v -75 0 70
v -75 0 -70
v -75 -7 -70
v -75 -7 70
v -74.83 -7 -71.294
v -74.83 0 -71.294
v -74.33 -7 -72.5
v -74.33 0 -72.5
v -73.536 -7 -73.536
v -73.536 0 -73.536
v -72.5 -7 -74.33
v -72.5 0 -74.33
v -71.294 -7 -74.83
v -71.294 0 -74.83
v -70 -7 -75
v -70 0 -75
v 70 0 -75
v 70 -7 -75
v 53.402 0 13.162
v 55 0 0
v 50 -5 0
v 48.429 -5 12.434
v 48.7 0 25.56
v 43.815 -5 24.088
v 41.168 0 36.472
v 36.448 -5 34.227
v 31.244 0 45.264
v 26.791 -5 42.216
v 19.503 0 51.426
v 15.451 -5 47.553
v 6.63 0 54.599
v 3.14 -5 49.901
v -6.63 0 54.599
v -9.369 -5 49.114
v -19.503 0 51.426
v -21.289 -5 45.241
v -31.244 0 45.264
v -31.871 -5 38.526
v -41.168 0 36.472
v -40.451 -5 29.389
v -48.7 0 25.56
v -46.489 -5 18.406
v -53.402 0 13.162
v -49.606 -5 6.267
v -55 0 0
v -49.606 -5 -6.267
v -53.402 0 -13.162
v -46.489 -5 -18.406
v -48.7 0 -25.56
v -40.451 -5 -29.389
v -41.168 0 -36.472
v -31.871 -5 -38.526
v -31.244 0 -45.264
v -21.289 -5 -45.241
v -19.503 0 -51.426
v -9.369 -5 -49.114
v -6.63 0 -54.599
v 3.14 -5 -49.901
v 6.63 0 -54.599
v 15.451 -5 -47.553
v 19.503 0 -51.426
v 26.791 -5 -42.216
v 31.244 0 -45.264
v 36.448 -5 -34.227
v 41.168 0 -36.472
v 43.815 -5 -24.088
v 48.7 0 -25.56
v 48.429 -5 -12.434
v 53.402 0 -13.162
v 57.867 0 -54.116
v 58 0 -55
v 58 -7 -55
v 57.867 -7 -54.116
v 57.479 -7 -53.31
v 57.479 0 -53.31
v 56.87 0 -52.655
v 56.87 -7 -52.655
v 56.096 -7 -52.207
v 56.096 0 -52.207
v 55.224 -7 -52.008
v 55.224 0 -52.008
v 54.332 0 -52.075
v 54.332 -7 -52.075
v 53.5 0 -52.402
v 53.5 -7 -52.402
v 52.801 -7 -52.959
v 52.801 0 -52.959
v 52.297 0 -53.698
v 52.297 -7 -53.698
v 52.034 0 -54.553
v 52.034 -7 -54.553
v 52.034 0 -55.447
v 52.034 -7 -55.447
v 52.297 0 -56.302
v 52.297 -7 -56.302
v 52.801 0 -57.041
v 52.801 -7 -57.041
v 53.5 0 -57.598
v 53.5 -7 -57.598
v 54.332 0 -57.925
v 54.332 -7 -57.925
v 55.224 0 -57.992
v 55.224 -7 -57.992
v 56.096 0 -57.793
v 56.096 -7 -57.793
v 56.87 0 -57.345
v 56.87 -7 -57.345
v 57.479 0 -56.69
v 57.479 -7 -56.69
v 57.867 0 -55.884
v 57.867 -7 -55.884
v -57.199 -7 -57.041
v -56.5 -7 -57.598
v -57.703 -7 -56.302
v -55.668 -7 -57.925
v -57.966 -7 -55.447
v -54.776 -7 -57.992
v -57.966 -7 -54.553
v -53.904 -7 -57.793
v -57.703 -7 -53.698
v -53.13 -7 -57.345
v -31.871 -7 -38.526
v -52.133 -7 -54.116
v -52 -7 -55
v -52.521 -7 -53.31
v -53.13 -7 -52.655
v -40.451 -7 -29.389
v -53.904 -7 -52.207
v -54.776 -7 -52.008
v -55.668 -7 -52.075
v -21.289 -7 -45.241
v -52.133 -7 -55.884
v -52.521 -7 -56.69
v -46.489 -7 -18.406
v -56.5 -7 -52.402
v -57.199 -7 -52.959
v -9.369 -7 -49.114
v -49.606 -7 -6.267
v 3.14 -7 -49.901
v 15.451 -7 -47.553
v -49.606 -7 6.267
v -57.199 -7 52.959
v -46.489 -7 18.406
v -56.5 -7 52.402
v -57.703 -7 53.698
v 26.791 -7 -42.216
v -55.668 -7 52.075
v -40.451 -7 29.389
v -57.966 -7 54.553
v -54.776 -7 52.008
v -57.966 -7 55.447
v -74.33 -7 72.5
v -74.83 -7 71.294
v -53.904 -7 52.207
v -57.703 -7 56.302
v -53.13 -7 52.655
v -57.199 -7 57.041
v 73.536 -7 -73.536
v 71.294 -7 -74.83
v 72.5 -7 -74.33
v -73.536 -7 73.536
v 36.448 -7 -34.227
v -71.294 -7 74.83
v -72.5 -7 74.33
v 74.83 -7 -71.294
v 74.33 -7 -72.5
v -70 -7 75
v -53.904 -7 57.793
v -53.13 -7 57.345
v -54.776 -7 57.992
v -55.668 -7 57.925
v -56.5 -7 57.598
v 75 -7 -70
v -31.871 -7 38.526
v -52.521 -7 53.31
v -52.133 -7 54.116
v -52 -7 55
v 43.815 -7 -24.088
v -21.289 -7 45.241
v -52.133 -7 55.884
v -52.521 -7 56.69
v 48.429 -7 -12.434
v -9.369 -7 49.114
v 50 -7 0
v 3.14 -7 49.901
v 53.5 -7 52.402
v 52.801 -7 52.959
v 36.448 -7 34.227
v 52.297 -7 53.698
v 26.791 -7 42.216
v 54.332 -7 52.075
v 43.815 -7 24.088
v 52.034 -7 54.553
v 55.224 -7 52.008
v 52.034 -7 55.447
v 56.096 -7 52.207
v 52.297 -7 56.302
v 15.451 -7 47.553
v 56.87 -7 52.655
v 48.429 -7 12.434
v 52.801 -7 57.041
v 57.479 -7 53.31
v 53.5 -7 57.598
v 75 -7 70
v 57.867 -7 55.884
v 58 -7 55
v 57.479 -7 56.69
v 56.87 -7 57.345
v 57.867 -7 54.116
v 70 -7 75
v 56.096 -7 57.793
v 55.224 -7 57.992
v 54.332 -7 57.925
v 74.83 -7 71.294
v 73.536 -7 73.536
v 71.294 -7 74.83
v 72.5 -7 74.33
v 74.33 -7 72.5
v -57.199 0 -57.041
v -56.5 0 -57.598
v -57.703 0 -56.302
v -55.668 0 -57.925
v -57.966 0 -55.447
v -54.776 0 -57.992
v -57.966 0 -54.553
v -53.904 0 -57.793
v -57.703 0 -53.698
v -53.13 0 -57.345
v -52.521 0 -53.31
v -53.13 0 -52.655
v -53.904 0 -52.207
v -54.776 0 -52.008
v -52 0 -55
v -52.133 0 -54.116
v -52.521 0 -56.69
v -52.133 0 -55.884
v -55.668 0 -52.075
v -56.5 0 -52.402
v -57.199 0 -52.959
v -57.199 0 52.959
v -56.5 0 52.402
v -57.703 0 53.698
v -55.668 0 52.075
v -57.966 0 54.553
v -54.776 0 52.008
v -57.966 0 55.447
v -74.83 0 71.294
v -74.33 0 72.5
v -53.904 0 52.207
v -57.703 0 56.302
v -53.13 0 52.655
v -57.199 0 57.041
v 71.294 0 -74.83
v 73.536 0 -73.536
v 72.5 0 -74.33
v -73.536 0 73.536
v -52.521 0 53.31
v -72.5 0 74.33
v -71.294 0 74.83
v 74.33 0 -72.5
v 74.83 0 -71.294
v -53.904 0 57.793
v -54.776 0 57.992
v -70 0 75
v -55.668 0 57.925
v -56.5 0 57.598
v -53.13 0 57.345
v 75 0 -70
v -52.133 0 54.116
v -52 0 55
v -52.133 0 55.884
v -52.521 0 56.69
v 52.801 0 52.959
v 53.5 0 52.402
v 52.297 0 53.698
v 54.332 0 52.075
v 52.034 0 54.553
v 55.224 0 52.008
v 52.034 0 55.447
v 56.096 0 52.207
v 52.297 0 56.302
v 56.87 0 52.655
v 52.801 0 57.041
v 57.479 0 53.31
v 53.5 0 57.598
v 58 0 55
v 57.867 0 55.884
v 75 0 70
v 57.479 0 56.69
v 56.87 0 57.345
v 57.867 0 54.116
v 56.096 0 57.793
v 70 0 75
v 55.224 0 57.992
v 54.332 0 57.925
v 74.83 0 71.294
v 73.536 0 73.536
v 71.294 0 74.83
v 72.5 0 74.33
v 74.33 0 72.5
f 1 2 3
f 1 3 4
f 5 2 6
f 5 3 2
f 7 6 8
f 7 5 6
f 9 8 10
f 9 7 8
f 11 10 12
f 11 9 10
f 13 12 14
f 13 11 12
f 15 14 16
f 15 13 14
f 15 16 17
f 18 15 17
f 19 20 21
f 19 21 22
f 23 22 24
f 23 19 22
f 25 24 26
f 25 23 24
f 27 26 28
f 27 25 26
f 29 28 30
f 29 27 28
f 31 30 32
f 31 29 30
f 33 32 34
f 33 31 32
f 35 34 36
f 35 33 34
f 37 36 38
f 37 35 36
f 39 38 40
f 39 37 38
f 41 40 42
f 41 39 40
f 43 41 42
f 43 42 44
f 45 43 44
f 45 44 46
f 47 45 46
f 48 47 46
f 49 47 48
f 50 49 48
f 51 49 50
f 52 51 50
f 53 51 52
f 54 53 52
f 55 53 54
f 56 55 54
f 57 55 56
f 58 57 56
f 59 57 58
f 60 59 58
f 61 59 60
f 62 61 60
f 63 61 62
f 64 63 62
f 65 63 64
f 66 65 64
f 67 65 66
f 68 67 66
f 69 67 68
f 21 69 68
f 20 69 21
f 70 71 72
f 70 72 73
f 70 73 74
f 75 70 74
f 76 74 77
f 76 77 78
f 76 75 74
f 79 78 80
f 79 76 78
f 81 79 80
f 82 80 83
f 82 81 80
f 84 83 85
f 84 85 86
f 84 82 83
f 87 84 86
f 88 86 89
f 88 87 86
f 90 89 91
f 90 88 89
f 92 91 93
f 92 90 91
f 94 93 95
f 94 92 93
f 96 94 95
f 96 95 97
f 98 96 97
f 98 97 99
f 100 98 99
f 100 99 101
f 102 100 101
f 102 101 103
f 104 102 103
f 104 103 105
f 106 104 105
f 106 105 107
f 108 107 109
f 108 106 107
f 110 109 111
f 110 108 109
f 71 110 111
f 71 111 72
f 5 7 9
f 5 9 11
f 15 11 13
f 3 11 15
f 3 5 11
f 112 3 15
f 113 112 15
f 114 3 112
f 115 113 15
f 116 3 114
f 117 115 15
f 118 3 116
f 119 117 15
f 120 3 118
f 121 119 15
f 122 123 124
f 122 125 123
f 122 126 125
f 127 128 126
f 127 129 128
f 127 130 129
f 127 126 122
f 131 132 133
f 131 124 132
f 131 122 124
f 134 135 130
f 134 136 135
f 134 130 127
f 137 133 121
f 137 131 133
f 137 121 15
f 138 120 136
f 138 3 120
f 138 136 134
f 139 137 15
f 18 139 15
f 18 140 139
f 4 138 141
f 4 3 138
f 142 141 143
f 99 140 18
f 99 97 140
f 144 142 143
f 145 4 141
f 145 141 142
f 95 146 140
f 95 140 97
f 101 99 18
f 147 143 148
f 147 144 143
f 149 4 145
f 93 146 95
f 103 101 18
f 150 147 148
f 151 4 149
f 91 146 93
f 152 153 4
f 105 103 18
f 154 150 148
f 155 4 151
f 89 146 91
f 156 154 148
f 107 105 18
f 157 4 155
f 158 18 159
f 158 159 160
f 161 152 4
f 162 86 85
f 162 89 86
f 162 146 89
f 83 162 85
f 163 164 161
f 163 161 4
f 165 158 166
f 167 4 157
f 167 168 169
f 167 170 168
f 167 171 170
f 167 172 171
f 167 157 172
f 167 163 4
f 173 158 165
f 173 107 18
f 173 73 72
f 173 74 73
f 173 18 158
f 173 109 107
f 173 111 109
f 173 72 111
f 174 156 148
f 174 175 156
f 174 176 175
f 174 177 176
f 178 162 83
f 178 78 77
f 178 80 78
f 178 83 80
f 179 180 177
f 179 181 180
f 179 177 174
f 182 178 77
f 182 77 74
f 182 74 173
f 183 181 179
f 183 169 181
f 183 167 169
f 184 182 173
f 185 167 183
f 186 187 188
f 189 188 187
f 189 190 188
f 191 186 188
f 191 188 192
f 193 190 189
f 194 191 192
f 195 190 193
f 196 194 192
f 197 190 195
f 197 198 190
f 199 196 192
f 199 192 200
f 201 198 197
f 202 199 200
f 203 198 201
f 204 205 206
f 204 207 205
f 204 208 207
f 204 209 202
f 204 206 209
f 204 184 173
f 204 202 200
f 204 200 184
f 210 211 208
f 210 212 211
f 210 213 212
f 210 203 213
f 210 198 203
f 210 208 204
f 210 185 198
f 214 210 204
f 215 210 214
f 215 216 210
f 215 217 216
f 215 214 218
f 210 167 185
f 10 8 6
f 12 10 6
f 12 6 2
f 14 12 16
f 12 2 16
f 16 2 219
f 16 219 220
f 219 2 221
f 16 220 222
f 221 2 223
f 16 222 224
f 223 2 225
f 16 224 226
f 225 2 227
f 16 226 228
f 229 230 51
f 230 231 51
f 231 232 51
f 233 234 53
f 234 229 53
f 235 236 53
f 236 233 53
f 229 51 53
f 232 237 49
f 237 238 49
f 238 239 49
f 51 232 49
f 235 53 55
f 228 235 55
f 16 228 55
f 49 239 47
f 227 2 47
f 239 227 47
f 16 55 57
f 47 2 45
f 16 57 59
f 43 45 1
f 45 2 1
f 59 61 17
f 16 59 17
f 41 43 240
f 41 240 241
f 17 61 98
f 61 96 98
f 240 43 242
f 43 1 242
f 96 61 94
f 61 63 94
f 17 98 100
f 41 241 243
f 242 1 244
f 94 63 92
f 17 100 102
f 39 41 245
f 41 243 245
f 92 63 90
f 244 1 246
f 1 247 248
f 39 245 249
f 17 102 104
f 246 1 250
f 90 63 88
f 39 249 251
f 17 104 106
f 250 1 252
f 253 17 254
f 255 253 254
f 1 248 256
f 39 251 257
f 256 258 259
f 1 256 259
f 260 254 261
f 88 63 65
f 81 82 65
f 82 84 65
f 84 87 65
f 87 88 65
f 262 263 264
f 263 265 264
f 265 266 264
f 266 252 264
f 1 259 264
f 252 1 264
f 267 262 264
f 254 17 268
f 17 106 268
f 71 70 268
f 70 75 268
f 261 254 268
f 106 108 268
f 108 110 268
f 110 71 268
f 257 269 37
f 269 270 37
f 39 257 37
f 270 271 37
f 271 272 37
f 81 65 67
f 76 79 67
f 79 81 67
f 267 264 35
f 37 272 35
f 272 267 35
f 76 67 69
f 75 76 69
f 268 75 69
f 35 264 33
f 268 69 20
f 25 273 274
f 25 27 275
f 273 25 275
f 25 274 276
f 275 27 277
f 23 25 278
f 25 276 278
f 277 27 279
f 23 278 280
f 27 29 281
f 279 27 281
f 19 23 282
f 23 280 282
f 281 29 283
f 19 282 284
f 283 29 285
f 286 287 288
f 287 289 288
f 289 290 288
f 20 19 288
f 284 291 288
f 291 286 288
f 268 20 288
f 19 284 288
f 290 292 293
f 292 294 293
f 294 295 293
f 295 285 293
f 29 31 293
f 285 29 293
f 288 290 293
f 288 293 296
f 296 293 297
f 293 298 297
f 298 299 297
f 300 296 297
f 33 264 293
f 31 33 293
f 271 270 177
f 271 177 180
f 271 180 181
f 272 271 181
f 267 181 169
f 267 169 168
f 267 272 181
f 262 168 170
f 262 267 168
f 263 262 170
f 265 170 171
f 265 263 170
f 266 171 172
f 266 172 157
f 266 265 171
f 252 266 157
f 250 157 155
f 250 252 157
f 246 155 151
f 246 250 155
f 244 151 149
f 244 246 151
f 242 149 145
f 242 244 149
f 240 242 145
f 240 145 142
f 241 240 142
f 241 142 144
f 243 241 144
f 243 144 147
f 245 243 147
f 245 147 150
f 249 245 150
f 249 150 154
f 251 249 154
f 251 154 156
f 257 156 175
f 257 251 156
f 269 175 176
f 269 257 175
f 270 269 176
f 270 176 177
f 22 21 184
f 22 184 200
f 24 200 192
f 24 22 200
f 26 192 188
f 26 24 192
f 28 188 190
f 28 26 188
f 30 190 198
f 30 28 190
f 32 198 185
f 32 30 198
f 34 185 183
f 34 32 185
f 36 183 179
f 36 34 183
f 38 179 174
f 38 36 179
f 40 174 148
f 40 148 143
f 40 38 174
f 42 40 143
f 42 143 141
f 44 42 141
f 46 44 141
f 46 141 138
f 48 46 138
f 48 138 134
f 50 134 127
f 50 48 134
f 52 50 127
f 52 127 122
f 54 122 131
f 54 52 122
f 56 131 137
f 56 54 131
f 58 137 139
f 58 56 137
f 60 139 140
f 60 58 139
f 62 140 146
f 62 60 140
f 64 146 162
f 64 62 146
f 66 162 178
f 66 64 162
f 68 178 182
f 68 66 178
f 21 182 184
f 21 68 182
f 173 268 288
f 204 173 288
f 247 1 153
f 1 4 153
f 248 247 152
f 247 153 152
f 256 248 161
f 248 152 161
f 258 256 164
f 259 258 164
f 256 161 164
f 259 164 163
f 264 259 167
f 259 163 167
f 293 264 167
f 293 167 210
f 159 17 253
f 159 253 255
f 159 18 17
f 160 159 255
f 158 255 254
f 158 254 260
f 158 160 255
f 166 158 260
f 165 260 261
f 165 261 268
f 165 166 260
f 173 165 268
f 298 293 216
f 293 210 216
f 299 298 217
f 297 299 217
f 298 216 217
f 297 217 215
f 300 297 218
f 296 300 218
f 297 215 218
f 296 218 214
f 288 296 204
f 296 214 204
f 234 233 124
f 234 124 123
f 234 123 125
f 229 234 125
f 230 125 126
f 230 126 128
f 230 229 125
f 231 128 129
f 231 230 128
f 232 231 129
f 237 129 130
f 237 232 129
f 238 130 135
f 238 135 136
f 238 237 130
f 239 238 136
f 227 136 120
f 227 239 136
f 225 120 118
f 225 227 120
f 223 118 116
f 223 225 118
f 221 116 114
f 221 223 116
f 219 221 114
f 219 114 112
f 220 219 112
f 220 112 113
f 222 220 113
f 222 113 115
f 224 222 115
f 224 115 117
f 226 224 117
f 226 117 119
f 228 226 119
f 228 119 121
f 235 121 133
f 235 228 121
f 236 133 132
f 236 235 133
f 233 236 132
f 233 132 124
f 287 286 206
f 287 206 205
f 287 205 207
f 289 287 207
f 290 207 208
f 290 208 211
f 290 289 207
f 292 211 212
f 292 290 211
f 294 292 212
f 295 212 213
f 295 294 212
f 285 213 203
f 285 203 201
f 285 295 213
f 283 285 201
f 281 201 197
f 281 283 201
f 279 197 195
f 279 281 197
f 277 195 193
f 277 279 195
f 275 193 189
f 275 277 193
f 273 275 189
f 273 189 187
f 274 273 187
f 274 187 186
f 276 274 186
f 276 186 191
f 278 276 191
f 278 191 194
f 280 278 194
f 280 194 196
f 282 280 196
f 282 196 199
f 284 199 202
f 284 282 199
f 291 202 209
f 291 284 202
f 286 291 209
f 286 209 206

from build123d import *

# Parameters (mm, degrees)
F0_W     = 150
F0_H     = 150
F0_R     = 3
F0_R_2   = 50
F1_DEPTH = 7
F2_SIZE2 = 5
F2_SIZE  = 5
F3_R     = 5


with BuildPart() as f1:
    # F0 (on Front) → F1 (new body)
    with BuildSketch(Plane.XZ):
        Rectangle(F0_W, F0_H)
        with Locations((-55, -55)):
            Circle(F0_R, mode=Mode.SUBTRACT)
        with Locations((55, -55)):
            Circle(F0_R, mode=Mode.SUBTRACT)
        with Locations((-55, 55)):
            Circle(F0_R, mode=Mode.SUBTRACT)
        Circle(F0_R_2, mode=Mode.SUBTRACT)
        with Locations((55, 55)):
            Circle(F0_R, mode=Mode.SUBTRACT)
    extrude(amount=F1_DEPTH)

    # F2
    f2_edges = [f1.edges().sort_by_distance(p)[0] for p in [
        (-50, 0, 0),
    ]]
    chamfer(f2_edges, length=F2_SIZE, length2=F2_SIZE2)

    # F3
    f3_edges = [f1.edges().sort_by_distance(p)[0] for p in [
        (75, -3.5, 75),
        (-75, -3.5, 75),
        (-75, -3.5, -75),
        (75, -3.5, -75),
    ]]
    fillet(f3_edges, radius=F3_R)


solid = f1.part
